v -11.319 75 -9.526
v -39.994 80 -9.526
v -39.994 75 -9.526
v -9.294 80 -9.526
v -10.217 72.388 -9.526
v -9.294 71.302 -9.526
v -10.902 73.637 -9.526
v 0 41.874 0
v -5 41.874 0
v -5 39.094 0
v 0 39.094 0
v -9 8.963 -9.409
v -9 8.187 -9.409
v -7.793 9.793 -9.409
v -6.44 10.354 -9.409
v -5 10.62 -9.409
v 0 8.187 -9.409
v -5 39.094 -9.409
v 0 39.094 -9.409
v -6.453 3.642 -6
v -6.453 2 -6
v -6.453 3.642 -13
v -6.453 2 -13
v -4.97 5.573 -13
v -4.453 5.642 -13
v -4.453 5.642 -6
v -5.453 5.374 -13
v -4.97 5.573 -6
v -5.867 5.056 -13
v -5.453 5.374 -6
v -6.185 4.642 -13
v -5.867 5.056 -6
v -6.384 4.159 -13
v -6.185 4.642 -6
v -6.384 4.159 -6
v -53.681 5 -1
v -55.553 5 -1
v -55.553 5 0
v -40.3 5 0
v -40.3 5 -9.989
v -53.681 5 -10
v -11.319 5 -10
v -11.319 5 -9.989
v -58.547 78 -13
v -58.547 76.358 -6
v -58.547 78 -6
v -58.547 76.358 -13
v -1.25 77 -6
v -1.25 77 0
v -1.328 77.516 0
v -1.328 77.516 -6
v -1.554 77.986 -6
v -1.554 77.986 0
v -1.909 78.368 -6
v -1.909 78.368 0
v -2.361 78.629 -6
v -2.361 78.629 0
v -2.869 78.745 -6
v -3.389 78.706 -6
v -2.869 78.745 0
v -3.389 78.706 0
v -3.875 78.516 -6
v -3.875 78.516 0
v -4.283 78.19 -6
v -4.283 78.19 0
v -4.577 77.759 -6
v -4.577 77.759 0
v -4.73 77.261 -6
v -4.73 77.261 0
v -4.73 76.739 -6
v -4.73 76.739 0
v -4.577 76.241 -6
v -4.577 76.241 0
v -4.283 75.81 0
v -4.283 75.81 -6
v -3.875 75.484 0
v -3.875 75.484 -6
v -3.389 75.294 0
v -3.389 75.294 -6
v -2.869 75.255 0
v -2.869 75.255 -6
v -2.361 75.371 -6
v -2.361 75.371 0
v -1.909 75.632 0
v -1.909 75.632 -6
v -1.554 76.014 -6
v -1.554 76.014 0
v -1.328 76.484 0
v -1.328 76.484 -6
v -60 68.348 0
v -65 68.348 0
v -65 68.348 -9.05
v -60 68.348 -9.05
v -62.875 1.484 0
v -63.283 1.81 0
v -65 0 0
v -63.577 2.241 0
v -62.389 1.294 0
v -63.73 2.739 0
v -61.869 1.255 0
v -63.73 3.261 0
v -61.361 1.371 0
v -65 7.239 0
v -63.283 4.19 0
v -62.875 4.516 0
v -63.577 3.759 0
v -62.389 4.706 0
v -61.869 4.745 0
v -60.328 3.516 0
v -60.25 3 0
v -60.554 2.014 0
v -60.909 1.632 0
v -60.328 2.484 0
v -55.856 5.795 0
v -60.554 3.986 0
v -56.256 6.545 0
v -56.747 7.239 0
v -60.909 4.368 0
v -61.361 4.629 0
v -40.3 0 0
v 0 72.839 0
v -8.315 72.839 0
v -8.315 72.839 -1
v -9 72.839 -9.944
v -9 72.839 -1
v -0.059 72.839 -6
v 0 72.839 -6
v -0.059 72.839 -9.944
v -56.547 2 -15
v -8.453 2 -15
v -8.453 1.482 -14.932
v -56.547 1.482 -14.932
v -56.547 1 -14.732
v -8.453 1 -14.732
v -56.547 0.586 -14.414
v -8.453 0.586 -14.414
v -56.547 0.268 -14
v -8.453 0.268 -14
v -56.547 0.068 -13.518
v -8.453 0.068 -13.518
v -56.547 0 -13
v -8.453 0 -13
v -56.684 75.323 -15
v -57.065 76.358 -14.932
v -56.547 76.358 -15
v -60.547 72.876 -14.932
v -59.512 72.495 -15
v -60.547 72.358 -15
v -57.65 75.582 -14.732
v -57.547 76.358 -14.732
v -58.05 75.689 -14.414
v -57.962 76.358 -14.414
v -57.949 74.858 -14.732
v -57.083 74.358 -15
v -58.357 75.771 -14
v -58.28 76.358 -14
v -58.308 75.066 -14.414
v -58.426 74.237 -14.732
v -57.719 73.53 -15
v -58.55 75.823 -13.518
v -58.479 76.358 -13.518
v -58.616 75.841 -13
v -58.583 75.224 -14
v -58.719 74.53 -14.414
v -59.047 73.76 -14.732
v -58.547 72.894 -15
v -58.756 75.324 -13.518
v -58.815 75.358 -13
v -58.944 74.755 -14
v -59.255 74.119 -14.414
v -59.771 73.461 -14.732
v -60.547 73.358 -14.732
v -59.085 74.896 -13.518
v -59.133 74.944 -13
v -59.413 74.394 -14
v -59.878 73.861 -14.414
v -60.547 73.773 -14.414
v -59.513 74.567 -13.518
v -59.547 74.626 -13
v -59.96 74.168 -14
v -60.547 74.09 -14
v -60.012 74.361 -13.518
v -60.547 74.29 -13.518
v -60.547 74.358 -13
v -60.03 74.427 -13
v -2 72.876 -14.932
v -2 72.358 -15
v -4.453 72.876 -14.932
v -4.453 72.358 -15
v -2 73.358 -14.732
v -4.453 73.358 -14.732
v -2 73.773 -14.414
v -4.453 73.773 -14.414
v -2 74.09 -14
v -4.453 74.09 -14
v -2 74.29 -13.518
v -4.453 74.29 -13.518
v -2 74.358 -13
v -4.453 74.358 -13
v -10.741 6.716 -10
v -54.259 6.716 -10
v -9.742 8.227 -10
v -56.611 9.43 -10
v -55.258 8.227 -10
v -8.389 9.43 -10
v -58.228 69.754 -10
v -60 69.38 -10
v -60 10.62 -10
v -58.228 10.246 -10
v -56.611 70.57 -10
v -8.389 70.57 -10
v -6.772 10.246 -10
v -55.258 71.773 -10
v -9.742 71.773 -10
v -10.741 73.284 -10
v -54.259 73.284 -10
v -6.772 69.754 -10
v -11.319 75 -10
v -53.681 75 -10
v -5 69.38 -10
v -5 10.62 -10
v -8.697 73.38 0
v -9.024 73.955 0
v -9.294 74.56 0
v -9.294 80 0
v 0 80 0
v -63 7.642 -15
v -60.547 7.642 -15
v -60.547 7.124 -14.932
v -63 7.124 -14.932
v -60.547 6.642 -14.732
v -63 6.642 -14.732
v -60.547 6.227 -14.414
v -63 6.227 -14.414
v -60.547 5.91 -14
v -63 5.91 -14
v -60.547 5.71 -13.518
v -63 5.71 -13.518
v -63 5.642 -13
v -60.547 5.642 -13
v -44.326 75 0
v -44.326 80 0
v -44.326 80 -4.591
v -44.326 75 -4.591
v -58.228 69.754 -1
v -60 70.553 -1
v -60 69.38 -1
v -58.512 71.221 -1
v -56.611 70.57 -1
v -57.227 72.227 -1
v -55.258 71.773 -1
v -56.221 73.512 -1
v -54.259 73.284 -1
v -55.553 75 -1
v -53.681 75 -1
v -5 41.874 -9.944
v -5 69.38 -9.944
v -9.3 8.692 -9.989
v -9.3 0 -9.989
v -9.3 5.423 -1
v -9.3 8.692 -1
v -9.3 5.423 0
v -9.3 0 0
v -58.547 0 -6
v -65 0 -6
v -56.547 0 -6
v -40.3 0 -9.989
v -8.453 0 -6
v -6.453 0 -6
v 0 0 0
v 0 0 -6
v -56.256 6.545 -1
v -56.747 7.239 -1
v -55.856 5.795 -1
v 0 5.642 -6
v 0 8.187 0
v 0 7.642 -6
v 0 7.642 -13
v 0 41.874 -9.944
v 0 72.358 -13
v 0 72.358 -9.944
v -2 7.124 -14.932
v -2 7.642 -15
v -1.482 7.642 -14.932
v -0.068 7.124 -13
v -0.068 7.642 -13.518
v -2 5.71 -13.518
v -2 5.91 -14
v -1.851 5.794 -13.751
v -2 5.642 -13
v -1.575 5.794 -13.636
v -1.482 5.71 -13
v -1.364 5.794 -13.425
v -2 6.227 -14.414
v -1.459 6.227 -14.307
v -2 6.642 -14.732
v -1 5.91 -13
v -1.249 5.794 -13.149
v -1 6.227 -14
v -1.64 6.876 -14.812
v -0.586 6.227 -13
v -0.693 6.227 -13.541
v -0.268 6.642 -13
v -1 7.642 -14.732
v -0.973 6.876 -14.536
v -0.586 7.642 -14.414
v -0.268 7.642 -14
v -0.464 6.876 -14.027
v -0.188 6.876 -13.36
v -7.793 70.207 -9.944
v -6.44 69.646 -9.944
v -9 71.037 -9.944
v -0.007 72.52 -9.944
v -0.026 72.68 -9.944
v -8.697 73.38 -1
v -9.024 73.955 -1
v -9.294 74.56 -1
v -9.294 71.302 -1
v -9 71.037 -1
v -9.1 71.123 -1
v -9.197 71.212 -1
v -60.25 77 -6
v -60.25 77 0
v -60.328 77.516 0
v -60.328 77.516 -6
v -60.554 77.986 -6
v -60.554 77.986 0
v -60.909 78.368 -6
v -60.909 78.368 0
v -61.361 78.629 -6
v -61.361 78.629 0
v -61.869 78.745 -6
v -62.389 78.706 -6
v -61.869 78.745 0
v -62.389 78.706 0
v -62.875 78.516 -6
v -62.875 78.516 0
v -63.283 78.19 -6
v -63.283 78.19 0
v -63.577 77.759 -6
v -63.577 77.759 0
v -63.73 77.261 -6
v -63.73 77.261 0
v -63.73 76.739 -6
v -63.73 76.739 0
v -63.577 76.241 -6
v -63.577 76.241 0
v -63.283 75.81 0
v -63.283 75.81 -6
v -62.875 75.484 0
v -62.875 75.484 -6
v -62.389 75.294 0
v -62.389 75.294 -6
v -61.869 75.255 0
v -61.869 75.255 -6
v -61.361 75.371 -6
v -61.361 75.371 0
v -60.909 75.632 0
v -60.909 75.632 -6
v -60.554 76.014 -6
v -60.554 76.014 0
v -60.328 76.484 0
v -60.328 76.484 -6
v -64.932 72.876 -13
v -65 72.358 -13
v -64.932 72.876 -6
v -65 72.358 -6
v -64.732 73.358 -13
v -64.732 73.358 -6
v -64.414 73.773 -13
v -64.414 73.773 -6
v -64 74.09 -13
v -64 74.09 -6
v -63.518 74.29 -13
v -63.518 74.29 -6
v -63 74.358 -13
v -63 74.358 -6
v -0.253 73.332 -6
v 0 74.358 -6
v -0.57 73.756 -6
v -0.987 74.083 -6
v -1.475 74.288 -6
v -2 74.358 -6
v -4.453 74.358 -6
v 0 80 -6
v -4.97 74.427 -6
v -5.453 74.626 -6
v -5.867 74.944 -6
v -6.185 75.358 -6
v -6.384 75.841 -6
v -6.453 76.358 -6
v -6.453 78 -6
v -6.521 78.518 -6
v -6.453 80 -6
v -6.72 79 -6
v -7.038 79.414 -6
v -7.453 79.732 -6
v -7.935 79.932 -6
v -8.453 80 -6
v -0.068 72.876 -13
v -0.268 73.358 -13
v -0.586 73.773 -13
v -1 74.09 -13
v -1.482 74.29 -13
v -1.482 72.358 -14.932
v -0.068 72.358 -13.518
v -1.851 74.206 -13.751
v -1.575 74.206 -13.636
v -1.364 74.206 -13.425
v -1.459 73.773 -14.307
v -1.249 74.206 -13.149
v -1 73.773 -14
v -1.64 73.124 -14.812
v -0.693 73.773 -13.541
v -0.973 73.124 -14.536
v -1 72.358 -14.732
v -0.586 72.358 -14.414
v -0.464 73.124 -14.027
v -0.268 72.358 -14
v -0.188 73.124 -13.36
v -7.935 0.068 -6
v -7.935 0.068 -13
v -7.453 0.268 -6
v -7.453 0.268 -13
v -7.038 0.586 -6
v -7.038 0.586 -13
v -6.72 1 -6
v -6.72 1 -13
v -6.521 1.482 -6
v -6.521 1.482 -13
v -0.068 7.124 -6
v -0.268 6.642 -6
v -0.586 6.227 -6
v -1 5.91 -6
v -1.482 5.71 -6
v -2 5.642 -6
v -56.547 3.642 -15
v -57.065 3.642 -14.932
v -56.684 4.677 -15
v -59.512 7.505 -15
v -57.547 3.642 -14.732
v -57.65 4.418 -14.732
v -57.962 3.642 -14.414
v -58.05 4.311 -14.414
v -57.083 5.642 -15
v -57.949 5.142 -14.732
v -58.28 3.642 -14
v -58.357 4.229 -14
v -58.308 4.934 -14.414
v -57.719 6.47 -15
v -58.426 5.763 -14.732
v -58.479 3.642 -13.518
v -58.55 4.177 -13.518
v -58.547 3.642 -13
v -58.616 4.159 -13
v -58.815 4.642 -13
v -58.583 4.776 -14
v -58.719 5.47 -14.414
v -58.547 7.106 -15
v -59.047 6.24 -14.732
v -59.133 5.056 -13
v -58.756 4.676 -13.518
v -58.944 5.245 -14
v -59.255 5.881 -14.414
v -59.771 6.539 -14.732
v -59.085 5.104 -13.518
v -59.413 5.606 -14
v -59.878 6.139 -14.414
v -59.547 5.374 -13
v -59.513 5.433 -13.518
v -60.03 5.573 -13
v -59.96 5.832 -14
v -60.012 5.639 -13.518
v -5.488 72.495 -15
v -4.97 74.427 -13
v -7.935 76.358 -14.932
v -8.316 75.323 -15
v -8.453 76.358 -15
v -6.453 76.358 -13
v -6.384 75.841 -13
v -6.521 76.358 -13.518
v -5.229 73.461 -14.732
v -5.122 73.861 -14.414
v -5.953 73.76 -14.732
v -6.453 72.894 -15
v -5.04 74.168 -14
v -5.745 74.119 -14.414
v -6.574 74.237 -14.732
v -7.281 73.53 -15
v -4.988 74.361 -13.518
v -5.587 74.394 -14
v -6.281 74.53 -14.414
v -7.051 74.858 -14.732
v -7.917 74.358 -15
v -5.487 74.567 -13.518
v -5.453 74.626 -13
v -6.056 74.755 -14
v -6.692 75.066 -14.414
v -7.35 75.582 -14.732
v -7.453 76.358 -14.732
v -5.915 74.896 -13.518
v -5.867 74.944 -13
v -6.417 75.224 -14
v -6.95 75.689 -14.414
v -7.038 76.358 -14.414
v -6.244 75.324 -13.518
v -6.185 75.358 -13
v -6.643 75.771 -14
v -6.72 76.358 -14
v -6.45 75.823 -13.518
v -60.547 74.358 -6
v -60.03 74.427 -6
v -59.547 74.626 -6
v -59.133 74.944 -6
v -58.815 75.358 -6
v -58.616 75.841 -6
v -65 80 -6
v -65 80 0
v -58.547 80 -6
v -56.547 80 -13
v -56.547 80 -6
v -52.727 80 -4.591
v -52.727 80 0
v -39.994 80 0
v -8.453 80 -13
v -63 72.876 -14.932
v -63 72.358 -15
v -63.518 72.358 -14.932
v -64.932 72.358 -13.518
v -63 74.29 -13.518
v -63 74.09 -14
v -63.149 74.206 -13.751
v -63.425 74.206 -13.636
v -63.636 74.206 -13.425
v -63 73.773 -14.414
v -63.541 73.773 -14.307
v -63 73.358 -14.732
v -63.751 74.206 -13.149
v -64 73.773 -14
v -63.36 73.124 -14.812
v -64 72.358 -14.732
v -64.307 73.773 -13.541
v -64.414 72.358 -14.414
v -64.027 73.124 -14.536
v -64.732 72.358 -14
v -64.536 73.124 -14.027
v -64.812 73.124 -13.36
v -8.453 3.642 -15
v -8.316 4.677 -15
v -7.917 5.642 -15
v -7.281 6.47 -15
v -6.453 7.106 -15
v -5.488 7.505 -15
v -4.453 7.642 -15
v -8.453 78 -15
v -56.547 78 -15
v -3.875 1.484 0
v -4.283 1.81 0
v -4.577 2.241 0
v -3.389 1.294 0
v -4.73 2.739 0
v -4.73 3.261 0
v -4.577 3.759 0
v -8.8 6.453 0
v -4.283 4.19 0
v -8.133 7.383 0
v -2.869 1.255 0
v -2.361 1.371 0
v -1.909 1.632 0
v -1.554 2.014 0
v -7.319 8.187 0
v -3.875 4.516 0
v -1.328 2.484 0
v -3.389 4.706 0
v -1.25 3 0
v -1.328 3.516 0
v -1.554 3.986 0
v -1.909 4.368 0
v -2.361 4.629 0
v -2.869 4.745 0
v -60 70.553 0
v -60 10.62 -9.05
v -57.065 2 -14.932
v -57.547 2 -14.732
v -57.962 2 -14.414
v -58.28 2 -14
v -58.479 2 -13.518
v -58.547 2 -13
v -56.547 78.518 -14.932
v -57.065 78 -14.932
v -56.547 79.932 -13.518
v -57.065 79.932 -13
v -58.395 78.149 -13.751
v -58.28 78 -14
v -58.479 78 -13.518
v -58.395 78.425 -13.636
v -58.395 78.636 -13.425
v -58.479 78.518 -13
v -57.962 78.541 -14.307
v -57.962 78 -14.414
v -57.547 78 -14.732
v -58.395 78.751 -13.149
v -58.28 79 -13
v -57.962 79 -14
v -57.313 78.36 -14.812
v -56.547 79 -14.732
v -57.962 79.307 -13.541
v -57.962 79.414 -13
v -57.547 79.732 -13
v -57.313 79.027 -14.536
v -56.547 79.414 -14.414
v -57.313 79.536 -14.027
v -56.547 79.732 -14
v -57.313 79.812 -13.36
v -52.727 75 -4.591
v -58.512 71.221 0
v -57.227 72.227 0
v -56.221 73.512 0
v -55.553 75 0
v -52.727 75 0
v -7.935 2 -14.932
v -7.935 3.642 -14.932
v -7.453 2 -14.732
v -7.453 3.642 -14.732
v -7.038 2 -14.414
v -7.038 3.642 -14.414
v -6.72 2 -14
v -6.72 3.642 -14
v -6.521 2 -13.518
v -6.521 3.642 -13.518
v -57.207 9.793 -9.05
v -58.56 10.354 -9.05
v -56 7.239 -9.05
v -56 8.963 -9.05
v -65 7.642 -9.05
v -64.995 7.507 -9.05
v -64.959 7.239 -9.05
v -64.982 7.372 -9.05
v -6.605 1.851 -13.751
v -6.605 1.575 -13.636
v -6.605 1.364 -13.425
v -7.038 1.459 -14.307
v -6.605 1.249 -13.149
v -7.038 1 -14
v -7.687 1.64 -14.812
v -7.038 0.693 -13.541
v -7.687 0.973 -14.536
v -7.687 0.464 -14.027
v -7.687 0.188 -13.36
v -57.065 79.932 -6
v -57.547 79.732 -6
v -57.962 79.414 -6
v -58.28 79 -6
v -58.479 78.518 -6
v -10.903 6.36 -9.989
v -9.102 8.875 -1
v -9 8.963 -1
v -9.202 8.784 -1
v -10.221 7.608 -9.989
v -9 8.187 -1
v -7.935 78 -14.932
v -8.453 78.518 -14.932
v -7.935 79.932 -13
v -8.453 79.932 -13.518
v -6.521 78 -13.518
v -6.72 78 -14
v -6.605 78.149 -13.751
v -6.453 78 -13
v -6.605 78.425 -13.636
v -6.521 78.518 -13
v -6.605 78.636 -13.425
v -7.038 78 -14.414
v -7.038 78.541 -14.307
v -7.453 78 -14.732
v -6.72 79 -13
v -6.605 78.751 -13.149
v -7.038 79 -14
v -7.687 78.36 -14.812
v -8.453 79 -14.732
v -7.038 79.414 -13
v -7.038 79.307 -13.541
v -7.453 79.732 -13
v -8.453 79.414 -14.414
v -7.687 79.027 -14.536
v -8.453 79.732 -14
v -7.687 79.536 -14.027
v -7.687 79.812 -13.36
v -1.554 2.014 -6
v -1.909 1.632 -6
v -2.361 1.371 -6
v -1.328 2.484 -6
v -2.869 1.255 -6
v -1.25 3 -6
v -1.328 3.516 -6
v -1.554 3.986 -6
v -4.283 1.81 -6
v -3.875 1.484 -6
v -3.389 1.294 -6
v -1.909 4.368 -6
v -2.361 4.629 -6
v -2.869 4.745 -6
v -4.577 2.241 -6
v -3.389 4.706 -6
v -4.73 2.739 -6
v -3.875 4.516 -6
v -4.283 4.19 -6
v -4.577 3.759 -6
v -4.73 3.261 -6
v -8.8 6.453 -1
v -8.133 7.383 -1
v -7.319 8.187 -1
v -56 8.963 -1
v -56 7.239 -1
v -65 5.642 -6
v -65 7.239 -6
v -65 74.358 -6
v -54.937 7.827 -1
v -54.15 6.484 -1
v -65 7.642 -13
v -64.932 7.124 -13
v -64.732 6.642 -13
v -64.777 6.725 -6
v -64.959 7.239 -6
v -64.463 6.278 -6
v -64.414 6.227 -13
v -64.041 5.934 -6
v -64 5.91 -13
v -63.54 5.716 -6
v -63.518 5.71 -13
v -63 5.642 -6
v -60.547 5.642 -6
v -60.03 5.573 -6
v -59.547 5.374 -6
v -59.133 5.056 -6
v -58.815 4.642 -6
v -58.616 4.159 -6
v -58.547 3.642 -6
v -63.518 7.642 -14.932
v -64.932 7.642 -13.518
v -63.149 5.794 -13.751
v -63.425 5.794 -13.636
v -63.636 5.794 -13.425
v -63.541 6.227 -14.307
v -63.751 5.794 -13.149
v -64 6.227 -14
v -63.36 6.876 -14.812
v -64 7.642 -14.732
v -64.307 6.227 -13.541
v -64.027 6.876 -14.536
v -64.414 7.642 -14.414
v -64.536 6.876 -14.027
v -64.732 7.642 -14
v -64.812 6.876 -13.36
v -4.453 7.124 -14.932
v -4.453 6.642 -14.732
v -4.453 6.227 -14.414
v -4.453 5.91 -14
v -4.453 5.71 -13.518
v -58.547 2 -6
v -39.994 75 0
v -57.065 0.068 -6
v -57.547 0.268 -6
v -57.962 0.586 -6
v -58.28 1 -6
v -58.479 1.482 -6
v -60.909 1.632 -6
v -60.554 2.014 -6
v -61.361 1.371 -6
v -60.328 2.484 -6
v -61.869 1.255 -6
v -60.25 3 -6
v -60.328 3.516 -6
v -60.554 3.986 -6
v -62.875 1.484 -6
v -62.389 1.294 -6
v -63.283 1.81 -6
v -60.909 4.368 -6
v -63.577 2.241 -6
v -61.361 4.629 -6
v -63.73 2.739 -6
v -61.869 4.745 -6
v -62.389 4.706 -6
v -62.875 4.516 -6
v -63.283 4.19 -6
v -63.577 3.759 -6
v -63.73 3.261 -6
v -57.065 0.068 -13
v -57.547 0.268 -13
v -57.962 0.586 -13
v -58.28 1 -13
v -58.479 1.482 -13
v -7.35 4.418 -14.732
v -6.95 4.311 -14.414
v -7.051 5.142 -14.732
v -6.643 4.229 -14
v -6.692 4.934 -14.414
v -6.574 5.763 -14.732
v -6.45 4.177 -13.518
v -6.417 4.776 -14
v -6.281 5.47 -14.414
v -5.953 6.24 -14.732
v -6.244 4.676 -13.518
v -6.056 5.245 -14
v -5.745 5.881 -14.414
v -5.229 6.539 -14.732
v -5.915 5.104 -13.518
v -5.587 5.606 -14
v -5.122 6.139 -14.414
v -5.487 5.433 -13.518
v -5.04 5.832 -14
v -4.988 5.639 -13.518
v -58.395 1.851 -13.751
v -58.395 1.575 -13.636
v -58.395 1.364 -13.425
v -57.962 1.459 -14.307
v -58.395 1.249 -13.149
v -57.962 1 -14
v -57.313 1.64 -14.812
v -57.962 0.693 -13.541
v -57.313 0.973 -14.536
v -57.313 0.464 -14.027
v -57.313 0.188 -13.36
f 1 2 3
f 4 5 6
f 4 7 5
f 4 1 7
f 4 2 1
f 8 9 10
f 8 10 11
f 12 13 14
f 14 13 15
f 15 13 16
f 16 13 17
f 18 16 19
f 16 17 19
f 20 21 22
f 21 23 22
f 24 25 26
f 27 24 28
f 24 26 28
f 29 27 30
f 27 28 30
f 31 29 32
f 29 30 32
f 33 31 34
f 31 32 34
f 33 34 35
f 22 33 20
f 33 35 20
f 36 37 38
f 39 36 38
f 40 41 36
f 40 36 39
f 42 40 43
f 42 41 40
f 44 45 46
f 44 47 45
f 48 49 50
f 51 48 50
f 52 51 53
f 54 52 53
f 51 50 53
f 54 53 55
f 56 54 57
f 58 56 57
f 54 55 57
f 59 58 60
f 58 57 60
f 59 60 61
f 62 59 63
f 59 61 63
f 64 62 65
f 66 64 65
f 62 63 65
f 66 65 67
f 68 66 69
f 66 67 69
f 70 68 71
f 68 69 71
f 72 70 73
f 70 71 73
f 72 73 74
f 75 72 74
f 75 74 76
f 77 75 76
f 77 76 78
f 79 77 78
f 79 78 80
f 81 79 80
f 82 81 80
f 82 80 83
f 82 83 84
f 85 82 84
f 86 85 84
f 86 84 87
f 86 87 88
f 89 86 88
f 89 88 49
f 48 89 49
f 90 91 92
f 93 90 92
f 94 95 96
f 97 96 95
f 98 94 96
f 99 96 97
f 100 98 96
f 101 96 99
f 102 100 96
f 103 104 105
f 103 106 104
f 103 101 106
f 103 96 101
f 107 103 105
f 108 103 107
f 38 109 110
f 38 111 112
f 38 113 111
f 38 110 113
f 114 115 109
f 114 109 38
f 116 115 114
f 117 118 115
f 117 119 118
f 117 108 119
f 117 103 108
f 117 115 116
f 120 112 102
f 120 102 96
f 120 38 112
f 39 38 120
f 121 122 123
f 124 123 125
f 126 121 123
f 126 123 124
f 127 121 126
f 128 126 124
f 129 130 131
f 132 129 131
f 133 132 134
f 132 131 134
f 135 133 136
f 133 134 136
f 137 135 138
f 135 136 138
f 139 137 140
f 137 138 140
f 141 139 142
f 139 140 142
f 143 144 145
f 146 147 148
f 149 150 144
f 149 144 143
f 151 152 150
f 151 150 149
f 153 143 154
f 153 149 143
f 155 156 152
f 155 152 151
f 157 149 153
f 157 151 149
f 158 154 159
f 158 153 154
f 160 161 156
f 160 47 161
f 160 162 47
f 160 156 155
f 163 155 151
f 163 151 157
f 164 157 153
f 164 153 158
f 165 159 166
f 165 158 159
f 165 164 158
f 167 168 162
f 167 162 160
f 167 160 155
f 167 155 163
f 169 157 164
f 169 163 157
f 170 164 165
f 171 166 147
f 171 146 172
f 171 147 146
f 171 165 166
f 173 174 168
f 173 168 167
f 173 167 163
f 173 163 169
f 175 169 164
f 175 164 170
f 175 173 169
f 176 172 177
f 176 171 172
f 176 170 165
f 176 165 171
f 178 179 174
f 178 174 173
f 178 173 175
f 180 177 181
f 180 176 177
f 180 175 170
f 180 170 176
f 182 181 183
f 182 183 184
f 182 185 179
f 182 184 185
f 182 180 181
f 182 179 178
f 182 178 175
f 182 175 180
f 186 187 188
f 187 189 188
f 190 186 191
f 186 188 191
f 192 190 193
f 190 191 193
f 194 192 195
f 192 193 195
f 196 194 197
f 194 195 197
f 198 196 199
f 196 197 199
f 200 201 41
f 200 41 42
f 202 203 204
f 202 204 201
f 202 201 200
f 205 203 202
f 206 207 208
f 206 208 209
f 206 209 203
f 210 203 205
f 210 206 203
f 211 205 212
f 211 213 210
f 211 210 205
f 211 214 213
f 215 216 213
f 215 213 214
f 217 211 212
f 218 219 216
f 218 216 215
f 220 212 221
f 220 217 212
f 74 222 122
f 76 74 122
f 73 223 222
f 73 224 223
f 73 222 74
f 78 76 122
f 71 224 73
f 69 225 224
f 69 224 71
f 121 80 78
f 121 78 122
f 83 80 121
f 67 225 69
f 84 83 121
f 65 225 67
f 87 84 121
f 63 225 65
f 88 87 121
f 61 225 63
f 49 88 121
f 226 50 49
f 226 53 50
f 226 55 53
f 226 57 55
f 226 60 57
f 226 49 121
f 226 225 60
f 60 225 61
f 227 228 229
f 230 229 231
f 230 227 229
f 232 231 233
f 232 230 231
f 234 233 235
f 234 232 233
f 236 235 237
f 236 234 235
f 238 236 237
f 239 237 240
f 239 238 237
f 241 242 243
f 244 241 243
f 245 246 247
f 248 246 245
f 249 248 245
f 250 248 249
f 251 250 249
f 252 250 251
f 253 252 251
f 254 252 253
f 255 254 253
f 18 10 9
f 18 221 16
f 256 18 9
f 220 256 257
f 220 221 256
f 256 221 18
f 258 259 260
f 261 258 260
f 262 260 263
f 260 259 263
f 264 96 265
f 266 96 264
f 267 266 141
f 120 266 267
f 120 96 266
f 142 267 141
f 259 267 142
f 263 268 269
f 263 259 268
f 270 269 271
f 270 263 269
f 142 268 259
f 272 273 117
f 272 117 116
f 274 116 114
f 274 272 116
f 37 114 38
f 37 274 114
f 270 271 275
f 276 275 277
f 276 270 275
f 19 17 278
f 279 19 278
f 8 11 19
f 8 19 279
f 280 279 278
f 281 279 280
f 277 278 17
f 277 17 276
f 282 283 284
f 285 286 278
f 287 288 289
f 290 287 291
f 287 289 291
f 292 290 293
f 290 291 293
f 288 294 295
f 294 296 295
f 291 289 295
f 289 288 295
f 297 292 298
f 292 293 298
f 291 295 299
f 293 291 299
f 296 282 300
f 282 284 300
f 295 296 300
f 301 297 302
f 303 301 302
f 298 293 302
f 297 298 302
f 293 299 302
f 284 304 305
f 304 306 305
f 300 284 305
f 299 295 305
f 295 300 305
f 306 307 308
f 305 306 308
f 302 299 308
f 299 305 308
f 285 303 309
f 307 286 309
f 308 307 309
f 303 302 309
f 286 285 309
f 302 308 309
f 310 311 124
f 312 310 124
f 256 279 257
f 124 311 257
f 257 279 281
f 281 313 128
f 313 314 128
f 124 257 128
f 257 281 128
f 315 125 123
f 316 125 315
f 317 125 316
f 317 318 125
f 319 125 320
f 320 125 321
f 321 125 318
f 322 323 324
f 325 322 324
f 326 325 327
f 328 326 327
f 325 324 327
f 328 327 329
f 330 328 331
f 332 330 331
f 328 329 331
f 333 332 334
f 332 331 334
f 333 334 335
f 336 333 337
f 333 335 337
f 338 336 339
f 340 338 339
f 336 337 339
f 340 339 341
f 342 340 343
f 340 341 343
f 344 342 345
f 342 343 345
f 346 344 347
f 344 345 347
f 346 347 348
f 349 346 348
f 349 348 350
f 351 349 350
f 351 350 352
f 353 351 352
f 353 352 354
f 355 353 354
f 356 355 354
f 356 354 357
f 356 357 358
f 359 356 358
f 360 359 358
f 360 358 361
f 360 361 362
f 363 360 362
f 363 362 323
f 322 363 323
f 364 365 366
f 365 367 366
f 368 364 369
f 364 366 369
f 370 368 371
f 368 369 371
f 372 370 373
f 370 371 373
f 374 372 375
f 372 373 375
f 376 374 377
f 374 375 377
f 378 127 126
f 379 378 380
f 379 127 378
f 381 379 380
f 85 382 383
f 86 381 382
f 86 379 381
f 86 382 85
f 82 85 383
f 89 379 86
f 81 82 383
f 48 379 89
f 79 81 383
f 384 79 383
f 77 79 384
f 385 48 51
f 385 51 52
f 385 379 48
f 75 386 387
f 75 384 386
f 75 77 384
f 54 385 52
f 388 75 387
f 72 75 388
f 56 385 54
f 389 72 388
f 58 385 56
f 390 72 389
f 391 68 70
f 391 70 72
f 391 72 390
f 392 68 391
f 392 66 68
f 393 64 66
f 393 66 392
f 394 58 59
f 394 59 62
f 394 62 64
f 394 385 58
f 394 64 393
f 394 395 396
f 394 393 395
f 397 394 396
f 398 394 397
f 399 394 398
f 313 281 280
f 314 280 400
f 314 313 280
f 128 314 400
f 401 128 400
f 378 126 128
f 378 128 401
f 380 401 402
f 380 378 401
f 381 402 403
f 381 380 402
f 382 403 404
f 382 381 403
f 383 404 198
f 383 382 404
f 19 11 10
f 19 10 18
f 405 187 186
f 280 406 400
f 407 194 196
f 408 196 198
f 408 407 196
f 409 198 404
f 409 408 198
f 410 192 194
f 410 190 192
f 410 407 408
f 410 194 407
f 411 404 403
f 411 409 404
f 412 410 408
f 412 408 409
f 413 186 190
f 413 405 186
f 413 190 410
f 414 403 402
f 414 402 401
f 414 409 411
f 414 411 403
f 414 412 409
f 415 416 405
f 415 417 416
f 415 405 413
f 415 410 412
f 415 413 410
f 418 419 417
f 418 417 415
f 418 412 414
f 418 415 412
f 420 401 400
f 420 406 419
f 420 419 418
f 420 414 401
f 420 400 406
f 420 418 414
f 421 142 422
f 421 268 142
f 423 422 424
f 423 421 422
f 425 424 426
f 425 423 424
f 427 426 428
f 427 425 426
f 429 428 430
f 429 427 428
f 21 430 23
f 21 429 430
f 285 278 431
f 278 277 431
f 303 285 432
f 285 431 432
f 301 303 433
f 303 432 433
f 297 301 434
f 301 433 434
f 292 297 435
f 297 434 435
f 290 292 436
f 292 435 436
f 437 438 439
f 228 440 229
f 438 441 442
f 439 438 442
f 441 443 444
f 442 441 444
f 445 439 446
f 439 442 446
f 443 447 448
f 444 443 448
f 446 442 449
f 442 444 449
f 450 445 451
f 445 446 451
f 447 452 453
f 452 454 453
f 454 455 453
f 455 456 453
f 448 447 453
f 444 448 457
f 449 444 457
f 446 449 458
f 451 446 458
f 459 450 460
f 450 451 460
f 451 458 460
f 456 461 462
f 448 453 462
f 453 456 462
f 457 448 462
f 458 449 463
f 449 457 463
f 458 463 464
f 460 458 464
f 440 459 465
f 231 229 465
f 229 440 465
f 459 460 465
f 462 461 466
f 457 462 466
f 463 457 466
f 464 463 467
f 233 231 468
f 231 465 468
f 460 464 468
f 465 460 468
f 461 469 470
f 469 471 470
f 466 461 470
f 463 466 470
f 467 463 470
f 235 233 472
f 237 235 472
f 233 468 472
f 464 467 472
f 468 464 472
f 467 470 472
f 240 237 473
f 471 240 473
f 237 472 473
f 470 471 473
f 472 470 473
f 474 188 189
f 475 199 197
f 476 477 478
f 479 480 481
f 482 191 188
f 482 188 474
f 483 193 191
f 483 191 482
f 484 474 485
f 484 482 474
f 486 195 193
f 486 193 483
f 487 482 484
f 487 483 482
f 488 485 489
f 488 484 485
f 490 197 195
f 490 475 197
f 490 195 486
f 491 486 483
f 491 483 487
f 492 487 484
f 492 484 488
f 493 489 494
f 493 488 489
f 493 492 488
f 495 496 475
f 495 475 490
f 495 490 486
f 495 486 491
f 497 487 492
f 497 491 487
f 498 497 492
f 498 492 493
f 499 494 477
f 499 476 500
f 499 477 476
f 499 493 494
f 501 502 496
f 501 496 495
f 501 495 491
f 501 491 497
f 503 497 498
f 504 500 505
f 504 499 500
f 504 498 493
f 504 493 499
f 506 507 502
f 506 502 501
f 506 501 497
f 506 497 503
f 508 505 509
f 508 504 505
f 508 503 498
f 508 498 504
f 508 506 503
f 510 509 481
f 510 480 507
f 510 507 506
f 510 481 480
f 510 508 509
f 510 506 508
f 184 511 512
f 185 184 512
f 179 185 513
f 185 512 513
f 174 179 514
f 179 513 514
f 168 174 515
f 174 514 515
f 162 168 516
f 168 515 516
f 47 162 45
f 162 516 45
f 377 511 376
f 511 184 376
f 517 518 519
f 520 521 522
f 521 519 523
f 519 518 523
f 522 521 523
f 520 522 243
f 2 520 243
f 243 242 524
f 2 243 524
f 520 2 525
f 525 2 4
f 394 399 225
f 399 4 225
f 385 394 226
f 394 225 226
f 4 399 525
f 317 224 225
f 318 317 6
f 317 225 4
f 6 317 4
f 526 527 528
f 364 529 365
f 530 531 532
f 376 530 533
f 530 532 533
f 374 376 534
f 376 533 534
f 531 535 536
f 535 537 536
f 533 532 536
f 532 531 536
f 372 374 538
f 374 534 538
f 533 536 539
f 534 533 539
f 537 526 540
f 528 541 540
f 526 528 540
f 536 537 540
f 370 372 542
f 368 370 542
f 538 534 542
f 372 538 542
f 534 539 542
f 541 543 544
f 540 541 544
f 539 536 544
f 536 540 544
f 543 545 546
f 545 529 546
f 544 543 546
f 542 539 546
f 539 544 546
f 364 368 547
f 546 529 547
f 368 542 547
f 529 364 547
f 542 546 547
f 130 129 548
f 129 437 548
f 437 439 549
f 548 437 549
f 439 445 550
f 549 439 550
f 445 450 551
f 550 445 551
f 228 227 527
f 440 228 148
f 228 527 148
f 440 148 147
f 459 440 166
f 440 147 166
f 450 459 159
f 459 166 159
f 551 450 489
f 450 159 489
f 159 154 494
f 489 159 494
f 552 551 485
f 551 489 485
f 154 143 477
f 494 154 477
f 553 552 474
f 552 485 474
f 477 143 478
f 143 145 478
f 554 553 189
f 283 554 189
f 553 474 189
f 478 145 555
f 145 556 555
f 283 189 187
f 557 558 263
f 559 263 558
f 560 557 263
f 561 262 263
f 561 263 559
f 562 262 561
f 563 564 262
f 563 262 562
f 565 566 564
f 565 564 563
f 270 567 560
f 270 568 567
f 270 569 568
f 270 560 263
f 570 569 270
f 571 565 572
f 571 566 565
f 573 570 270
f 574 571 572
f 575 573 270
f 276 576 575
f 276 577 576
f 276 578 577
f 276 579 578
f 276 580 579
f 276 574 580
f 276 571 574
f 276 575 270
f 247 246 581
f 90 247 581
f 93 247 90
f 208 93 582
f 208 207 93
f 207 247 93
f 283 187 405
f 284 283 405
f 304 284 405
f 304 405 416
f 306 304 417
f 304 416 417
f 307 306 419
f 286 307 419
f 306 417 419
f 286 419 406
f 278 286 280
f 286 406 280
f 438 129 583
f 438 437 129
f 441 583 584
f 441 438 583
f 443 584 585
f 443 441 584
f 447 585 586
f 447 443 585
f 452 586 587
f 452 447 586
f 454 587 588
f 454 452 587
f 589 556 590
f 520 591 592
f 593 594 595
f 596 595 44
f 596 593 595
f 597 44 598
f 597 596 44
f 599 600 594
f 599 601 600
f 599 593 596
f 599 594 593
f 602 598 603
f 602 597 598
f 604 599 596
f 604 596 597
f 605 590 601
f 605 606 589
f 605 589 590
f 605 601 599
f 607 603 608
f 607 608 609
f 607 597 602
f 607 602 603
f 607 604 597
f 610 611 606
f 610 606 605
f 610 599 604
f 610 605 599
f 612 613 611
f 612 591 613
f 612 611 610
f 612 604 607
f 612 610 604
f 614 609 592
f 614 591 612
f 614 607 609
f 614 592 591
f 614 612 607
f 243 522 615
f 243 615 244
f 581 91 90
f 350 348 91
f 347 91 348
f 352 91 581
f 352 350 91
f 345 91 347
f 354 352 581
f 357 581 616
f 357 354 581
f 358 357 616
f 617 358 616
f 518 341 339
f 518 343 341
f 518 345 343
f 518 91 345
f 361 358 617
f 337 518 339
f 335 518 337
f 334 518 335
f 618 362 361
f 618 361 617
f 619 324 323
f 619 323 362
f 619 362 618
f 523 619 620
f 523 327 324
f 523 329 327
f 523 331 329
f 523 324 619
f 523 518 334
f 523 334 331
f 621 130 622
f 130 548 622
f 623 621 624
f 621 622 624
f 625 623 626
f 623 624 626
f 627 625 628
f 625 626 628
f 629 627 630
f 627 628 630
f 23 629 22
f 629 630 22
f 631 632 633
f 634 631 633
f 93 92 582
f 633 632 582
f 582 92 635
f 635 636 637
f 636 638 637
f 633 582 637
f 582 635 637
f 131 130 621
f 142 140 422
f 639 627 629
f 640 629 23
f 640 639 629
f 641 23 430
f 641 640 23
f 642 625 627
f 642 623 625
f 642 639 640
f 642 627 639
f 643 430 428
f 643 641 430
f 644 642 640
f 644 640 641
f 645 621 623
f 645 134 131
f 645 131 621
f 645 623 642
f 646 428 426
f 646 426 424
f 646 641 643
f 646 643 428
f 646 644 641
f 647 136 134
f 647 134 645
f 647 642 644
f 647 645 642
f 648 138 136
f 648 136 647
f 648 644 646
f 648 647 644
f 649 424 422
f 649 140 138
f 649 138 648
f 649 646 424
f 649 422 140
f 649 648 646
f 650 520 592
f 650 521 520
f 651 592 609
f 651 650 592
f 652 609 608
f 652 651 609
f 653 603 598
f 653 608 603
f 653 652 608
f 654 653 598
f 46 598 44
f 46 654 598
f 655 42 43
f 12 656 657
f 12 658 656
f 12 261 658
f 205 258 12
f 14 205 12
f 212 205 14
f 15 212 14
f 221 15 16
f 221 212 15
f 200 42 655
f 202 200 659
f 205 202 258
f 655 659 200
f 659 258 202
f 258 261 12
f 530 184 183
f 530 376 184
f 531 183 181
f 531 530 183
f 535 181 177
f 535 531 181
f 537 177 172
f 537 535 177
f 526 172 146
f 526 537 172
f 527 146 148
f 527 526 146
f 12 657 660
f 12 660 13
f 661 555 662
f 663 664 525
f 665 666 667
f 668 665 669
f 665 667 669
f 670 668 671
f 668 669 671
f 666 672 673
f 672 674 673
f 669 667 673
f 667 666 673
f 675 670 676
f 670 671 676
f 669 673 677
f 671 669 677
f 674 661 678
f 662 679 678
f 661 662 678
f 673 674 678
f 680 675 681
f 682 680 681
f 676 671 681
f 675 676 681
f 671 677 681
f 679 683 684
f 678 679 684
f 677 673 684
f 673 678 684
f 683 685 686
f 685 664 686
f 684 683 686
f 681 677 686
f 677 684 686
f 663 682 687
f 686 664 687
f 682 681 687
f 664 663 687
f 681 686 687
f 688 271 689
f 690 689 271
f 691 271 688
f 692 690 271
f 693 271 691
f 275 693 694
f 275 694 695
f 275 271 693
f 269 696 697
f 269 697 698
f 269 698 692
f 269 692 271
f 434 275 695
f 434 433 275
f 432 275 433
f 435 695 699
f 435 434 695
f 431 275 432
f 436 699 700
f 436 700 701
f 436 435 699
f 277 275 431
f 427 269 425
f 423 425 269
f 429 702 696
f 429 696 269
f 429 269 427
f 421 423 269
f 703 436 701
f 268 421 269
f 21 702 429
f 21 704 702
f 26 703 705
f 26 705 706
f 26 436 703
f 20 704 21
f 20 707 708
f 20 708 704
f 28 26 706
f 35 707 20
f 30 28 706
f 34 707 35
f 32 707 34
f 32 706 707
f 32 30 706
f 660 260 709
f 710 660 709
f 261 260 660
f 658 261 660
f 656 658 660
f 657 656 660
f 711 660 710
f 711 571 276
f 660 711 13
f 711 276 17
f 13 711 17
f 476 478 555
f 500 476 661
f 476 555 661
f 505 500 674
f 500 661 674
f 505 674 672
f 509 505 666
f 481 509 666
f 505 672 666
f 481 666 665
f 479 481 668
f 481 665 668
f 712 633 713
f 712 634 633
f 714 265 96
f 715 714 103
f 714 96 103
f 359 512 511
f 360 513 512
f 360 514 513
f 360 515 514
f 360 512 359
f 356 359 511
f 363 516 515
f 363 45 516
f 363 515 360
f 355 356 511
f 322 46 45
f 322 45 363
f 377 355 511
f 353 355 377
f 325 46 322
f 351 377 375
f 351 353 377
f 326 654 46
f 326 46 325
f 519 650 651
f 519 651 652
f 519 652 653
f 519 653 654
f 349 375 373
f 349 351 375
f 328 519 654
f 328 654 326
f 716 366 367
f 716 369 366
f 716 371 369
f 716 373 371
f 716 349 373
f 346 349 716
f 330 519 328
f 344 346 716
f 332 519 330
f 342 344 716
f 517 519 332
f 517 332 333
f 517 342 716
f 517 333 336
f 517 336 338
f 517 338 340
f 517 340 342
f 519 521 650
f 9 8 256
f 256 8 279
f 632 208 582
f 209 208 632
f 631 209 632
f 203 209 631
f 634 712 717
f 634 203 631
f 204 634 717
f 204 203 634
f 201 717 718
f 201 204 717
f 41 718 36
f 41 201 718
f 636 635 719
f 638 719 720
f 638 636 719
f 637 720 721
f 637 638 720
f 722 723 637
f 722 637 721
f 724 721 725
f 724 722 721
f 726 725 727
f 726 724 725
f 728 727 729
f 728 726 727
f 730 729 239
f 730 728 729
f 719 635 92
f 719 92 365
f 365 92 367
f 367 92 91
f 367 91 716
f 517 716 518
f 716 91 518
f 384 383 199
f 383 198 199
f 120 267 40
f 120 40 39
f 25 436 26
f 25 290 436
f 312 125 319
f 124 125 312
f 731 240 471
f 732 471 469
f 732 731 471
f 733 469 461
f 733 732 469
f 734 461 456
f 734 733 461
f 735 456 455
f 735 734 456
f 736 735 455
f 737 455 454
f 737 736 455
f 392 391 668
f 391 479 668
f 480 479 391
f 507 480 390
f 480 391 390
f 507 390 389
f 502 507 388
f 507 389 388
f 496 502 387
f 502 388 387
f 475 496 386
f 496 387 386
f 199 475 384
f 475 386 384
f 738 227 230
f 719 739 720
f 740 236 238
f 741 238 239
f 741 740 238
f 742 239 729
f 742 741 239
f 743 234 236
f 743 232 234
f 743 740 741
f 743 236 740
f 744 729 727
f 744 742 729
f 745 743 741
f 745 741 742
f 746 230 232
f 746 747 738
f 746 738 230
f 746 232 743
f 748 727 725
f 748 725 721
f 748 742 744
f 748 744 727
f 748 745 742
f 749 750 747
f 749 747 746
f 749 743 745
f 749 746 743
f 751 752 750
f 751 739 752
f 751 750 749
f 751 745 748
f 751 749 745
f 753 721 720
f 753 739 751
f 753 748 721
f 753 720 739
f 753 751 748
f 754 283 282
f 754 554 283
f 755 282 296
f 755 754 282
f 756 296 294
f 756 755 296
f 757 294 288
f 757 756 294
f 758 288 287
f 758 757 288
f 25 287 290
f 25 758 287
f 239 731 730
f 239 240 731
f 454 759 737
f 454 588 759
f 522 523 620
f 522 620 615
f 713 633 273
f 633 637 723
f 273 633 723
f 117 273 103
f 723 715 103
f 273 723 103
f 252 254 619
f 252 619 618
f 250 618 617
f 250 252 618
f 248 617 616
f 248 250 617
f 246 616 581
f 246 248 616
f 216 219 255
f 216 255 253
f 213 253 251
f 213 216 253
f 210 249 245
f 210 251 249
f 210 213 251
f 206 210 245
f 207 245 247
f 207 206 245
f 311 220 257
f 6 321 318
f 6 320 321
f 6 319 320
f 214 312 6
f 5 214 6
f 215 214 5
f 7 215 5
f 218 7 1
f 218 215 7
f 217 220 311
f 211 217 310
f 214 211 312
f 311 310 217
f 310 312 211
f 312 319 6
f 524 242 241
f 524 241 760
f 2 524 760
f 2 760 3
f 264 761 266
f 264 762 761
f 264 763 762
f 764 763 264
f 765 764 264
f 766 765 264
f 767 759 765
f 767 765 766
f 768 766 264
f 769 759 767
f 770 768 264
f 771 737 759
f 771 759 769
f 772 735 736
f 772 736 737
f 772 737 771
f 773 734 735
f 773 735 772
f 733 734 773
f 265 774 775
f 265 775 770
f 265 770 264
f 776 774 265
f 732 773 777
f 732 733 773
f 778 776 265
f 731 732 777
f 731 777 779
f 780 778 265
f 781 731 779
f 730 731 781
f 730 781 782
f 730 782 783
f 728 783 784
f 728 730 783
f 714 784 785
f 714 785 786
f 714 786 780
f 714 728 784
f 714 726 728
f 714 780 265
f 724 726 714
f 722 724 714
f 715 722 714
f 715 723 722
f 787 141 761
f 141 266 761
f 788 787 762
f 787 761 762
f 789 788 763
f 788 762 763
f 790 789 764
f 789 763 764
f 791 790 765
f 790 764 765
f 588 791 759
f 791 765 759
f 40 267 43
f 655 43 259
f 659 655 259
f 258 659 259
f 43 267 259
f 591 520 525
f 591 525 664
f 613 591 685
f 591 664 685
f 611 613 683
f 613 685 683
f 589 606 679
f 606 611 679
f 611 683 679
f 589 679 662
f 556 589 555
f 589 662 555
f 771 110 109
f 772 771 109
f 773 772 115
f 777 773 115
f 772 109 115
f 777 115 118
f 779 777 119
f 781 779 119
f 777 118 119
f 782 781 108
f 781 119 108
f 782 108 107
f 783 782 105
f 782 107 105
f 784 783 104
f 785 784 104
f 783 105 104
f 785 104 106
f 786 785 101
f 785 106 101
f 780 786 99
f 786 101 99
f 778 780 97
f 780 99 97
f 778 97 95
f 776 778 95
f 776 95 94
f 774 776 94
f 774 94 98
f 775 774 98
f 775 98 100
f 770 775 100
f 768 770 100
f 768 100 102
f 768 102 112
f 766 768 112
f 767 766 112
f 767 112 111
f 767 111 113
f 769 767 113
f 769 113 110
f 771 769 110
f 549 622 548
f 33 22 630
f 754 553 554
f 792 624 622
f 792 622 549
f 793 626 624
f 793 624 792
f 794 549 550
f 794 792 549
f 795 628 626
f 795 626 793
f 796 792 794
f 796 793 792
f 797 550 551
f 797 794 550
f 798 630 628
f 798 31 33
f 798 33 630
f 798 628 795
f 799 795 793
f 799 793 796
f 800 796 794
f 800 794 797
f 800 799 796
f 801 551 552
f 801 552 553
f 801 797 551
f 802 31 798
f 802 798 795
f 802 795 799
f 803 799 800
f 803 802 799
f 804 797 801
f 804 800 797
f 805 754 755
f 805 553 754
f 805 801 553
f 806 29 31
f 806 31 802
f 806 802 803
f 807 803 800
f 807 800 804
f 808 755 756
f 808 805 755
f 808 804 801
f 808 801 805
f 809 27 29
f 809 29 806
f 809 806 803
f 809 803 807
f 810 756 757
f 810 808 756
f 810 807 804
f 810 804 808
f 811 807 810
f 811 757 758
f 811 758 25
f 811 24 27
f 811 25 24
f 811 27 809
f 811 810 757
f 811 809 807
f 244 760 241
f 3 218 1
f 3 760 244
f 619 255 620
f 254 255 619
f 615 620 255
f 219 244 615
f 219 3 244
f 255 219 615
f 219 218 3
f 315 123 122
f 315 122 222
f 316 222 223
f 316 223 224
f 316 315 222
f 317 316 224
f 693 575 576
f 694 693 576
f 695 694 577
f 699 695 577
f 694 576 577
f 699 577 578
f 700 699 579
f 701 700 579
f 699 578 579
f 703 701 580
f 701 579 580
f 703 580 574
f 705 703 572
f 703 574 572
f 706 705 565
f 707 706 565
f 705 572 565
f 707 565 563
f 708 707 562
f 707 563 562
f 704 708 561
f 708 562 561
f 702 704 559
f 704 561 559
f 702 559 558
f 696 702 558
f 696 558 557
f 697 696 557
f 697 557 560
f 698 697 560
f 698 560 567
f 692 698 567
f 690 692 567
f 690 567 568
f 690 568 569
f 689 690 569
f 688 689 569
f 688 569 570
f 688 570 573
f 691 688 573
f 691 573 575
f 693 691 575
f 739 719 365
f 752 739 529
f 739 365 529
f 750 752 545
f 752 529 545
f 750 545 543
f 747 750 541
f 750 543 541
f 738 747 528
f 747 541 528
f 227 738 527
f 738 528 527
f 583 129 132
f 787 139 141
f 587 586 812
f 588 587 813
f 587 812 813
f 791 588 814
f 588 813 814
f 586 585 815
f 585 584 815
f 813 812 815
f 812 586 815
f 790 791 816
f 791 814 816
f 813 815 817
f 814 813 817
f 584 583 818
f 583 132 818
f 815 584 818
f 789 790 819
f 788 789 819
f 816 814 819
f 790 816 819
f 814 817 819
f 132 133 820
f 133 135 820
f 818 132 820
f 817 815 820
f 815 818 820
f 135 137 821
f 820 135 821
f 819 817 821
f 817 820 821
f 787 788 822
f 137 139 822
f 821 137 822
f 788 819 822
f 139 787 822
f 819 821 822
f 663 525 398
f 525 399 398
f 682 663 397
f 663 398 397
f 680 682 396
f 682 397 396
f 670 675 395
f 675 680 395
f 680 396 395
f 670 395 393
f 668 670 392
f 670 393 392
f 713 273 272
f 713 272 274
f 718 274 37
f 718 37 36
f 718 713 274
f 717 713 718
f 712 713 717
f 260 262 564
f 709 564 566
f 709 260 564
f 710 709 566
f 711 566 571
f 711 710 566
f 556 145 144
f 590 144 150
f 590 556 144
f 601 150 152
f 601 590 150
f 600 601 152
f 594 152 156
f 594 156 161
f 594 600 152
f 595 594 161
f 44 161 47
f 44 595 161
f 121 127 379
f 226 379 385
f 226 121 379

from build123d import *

# Parameters (mm, degrees)
SKETCH1_W           = 65
SKETCH1_H           = 80
BOSS_EXTRUDE1_DEPTH = 15
SKETCH2_R           = 1.75
CUT_EXTRUDE1_DEPTH  = 15
SKETCH3_W           = 6.452545503
SKETCH3_H           = 5.641605939
CUT_EXTRUDE2_DEPTH  = 9
FILLET1_R           = 2
SHELL1_START        = -10
SHELL1_DEPTH        = 10
SHELL1_START_2      = -1
SHELL1_2_DEPTH      = 1
SKETCH4_W           = 31
SKETCH4_H           = 9.988916405
CUT_EXTRUDE3_DEPTH  = 9
SKETCH5_W           = 9.944131197
SKETCH5_H           = 30.964366914
SKETCH5_W_2         = 9.409197356
SKETCH5_H_2         = 30.907117663
CUT_EXTRUDE4_DEPTH  = 9
SKETCH6_W           = 8.400929104
SKETCH6_H           = 4.591319751
SKETCH6_W_2         = 30.7
SKETCH6_H_2         = 9.525851227
CUT_EXTRUDE5_DEPTH  = 9
CUT_EXTRUDE6_DEPTH  = 9


# Read off the part's stored shape, not the designer's step: Shell1
with BuildPart() as part:
    # Sketch1 → Boss-Extrude1 (new body)
    with BuildSketch(Plane.XY):
        with Locations((-32.5, 40)):
            Rectangle(SKETCH1_W, SKETCH1_H)
    extrude(amount=-BOSS_EXTRUDE1_DEPTH)

    # Sketch2 → Cut-Extrude1 (cut)
    with BuildSketch(Plane.XY):
        with Locations((-3, 3)):
            Circle(SKETCH2_R)
        with Locations((-62, 3)):
            Circle(SKETCH2_R)
        with Locations((-62, 77)):
            Circle(SKETCH2_R)
        with Locations((-3, 77)):
            Circle(SKETCH2_R)
    extrude(amount=-CUT_EXTRUDE1_DEPTH, mode=Mode.SUBTRACT)

    # Sketch3 → Cut-Extrude2 (cut)
    with BuildSketch(Plane(origin=(0, 0, -15), x_dir=(-1, 0, 0), z_dir=(0, 0, -1))):
        with Locations((3.226272752, 77.179197031)):
            Rectangle(SKETCH3_W, SKETCH3_H)
        with Locations((61.773727249, 77.179197031)):
            Rectangle(SKETCH3_W, SKETCH3_H)
        with Locations((3.226272752, 2.82080297)):
            Rectangle(SKETCH3_W, SKETCH3_H)
        with Locations((61.773727249, 2.82080297)):
            Rectangle(SKETCH3_W, SKETCH3_H)
    extrude(amount=-CUT_EXTRUDE2_DEPTH, mode=Mode.SUBTRACT)

    # Fillet1
    fillet1_edges = [part.edges().sort_by_distance(p)[0] for p in [
        (-32.5, 0, -15),
        (-65, 40, -15),
        (-32.5, 80, -15),
        (0, 40, -15),
        (-58.547454497, 77.17919703, -15),
        (-61.773727249, 74.358394061, -15),
        (-58.547454497, 74.358394061, -10.5),
        (-58.547454497, 80, -10.5),
        (-65, 74.358394061, -10.5),
        (-6.452545503, 2.82080297, -15),
        (-3.226272751, 5.641605939, -15),
        (0, 5.641605939, -10.5),
        (-6.452545503, 5.641605939, -10.5),
        (-6.452545503, 0, -10.5),
        (-58.547454497, 2.82080297, -15),
        (-61.773727249, 5.641605939, -15),
        (-58.547454497, 0, -10.5),
        (-58.547454497, 5.641605939, -10.5),
        (-65, 5.641605939, -10.5),
        (-3.226272751, 74.358394061, -15),
        (-6.452545503, 77.17919703, -15),
        (0, 74.358394061, -10.5),
        (-6.452545503, 80, -10.5),
        (-6.452545503, 74.358394061, -10.5),
    ]]
    fillet(fillet1_edges, radius=FILLET1_R)

    # Shell1 outline → Shell1 (cut)
    with BuildSketch(Plane.XY.offset(SHELL1_START)):
        with BuildLine():
            ThreePointArc((-11.319478266, 5), (-9.104410686, 8.872299041), (-5, 10.620165502))
            Line((-5, 10.620165502), (-5, 69.379834498))
            ThreePointArc((-5, 69.379834498), (-9.104410686, 71.127700959), (-11.319478266, 75))
            Line((-11.319478266, 75), (-53.680521734, 75))
            ThreePointArc((-53.680521734, 75), (-55.895589314, 71.127700959), (-60, 69.379834498))
            Line((-60, 69.379834498), (-60, 10.620165502))
            ThreePointArc((-60, 10.620165502), (-55.895589314, 8.872299041), (-53.680521734, 5))
            Line((-53.680521734, 5), (-11.319478266, 5))
        make_face()
    extrude(amount=SHELL1_DEPTH, mode=Mode.SUBTRACT)

    # Shell1 2 outline → Shell1 2 (cut)
    with BuildSketch(Plane.XY.offset(SHELL1_START_2)):
        with BuildLine():
            ThreePointArc((-9.446898479, 5), (-7.772970773, 7.772970773), (-5, 9.446898479))
            Line((-5, 9.446898479), (-5, 10.620165502))
            ThreePointArc((-5, 10.620165502), (-9.104410686, 8.872299041), (-11.319478266, 5))
            Line((-11.319478266, 5), (-9.446898479, 5))
        make_face()
        with BuildLine():
            ThreePointArc((-11.319478266, 75), (-9.104410686, 71.127700959), (-5, 69.379834498))
            Line((-5, 69.379834498), (-5, 70.553101521))
            ThreePointArc((-5, 70.553101521), (-7.772970773, 72.227029227), (-9.446898479, 75))
            Line((-9.446898479, 75), (-11.319478266, 75))
        make_face()
        with BuildLine():
            Line((-55.553101521, 5), (-53.680521734, 5))
            ThreePointArc((-53.680521734, 5), (-55.895589314, 8.872299041), (-60, 10.620165502))
            Line((-60, 10.620165502), (-60, 9.446898479))
            ThreePointArc((-60, 9.446898479), (-57.227029227, 7.772970773), (-55.553101521, 5))
        make_face()
        with BuildLine():
            ThreePointArc((-60, 69.379834498), (-55.895589314, 71.127700959), (-53.680521734, 75))
            Line((-53.680521734, 75), (-55.553101521, 75))
            ThreePointArc((-55.553101521, 75), (-57.227029227, 72.227029227), (-60, 70.553101521))
            Line((-60, 70.553101521), (-60, 69.379834498))
        make_face()
    extrude(amount=SHELL1_2_DEPTH, mode=Mode.SUBTRACT)

    # Sketch4 → Cut-Extrude3 (cut)
    with BuildSketch(Plane.XZ):
        with Locations((-24.8, -4.994458203)):
            Rectangle(SKETCH4_W, SKETCH4_H)
    extrude(amount=-CUT_EXTRUDE3_DEPTH, mode=Mode.SUBTRACT)

    # Sketch5 → Cut-Extrude4 (cut)
    with BuildSketch(Plane(origin=(0, 0, 0), x_dir=(0, 0, -1), z_dir=(1, 0, 0))):
        with Locations((4.972065599, 57.356572465)):
            Rectangle(SKETCH5_W, SKETCH5_H)
        with Locations((4.704598678, 23.640694869)):
            Rectangle(SKETCH5_W_2, SKETCH5_H_2)
    extrude(amount=-CUT_EXTRUDE4_DEPTH, mode=Mode.SUBTRACT)

    # Sketch6 → Cut-Extrude5 (cut)
    with BuildSketch(Plane(origin=(0, 80, 0), x_dir=(1, 0, 0), z_dir=(0, 1, 0))):
        with Locations((-48.526627408, 2.295659876)):
            Rectangle(SKETCH6_W, SKETCH6_H)
        with Locations((-24.643720135, 4.762925614)):
            Rectangle(SKETCH6_W_2, SKETCH6_H_2)
    extrude(amount=-CUT_EXTRUDE5_DEPTH, mode=Mode.SUBTRACT)

    # Sketch7 → Cut-Extrude6 (cut)
    with BuildSketch(Plane.ZY.offset(65)):
        Polygon((-0.41148, 7.238999939), (0, 7.238999939), (0, 68.347517032), (-0.41148, 68.347517032), (-9.049681563, 68.347517032), (-9.049681563, 7.238999939), align=None)
    extrude(amount=-CUT_EXTRUDE6_DEPTH, mode=Mode.SUBTRACT)


solid = part.part
